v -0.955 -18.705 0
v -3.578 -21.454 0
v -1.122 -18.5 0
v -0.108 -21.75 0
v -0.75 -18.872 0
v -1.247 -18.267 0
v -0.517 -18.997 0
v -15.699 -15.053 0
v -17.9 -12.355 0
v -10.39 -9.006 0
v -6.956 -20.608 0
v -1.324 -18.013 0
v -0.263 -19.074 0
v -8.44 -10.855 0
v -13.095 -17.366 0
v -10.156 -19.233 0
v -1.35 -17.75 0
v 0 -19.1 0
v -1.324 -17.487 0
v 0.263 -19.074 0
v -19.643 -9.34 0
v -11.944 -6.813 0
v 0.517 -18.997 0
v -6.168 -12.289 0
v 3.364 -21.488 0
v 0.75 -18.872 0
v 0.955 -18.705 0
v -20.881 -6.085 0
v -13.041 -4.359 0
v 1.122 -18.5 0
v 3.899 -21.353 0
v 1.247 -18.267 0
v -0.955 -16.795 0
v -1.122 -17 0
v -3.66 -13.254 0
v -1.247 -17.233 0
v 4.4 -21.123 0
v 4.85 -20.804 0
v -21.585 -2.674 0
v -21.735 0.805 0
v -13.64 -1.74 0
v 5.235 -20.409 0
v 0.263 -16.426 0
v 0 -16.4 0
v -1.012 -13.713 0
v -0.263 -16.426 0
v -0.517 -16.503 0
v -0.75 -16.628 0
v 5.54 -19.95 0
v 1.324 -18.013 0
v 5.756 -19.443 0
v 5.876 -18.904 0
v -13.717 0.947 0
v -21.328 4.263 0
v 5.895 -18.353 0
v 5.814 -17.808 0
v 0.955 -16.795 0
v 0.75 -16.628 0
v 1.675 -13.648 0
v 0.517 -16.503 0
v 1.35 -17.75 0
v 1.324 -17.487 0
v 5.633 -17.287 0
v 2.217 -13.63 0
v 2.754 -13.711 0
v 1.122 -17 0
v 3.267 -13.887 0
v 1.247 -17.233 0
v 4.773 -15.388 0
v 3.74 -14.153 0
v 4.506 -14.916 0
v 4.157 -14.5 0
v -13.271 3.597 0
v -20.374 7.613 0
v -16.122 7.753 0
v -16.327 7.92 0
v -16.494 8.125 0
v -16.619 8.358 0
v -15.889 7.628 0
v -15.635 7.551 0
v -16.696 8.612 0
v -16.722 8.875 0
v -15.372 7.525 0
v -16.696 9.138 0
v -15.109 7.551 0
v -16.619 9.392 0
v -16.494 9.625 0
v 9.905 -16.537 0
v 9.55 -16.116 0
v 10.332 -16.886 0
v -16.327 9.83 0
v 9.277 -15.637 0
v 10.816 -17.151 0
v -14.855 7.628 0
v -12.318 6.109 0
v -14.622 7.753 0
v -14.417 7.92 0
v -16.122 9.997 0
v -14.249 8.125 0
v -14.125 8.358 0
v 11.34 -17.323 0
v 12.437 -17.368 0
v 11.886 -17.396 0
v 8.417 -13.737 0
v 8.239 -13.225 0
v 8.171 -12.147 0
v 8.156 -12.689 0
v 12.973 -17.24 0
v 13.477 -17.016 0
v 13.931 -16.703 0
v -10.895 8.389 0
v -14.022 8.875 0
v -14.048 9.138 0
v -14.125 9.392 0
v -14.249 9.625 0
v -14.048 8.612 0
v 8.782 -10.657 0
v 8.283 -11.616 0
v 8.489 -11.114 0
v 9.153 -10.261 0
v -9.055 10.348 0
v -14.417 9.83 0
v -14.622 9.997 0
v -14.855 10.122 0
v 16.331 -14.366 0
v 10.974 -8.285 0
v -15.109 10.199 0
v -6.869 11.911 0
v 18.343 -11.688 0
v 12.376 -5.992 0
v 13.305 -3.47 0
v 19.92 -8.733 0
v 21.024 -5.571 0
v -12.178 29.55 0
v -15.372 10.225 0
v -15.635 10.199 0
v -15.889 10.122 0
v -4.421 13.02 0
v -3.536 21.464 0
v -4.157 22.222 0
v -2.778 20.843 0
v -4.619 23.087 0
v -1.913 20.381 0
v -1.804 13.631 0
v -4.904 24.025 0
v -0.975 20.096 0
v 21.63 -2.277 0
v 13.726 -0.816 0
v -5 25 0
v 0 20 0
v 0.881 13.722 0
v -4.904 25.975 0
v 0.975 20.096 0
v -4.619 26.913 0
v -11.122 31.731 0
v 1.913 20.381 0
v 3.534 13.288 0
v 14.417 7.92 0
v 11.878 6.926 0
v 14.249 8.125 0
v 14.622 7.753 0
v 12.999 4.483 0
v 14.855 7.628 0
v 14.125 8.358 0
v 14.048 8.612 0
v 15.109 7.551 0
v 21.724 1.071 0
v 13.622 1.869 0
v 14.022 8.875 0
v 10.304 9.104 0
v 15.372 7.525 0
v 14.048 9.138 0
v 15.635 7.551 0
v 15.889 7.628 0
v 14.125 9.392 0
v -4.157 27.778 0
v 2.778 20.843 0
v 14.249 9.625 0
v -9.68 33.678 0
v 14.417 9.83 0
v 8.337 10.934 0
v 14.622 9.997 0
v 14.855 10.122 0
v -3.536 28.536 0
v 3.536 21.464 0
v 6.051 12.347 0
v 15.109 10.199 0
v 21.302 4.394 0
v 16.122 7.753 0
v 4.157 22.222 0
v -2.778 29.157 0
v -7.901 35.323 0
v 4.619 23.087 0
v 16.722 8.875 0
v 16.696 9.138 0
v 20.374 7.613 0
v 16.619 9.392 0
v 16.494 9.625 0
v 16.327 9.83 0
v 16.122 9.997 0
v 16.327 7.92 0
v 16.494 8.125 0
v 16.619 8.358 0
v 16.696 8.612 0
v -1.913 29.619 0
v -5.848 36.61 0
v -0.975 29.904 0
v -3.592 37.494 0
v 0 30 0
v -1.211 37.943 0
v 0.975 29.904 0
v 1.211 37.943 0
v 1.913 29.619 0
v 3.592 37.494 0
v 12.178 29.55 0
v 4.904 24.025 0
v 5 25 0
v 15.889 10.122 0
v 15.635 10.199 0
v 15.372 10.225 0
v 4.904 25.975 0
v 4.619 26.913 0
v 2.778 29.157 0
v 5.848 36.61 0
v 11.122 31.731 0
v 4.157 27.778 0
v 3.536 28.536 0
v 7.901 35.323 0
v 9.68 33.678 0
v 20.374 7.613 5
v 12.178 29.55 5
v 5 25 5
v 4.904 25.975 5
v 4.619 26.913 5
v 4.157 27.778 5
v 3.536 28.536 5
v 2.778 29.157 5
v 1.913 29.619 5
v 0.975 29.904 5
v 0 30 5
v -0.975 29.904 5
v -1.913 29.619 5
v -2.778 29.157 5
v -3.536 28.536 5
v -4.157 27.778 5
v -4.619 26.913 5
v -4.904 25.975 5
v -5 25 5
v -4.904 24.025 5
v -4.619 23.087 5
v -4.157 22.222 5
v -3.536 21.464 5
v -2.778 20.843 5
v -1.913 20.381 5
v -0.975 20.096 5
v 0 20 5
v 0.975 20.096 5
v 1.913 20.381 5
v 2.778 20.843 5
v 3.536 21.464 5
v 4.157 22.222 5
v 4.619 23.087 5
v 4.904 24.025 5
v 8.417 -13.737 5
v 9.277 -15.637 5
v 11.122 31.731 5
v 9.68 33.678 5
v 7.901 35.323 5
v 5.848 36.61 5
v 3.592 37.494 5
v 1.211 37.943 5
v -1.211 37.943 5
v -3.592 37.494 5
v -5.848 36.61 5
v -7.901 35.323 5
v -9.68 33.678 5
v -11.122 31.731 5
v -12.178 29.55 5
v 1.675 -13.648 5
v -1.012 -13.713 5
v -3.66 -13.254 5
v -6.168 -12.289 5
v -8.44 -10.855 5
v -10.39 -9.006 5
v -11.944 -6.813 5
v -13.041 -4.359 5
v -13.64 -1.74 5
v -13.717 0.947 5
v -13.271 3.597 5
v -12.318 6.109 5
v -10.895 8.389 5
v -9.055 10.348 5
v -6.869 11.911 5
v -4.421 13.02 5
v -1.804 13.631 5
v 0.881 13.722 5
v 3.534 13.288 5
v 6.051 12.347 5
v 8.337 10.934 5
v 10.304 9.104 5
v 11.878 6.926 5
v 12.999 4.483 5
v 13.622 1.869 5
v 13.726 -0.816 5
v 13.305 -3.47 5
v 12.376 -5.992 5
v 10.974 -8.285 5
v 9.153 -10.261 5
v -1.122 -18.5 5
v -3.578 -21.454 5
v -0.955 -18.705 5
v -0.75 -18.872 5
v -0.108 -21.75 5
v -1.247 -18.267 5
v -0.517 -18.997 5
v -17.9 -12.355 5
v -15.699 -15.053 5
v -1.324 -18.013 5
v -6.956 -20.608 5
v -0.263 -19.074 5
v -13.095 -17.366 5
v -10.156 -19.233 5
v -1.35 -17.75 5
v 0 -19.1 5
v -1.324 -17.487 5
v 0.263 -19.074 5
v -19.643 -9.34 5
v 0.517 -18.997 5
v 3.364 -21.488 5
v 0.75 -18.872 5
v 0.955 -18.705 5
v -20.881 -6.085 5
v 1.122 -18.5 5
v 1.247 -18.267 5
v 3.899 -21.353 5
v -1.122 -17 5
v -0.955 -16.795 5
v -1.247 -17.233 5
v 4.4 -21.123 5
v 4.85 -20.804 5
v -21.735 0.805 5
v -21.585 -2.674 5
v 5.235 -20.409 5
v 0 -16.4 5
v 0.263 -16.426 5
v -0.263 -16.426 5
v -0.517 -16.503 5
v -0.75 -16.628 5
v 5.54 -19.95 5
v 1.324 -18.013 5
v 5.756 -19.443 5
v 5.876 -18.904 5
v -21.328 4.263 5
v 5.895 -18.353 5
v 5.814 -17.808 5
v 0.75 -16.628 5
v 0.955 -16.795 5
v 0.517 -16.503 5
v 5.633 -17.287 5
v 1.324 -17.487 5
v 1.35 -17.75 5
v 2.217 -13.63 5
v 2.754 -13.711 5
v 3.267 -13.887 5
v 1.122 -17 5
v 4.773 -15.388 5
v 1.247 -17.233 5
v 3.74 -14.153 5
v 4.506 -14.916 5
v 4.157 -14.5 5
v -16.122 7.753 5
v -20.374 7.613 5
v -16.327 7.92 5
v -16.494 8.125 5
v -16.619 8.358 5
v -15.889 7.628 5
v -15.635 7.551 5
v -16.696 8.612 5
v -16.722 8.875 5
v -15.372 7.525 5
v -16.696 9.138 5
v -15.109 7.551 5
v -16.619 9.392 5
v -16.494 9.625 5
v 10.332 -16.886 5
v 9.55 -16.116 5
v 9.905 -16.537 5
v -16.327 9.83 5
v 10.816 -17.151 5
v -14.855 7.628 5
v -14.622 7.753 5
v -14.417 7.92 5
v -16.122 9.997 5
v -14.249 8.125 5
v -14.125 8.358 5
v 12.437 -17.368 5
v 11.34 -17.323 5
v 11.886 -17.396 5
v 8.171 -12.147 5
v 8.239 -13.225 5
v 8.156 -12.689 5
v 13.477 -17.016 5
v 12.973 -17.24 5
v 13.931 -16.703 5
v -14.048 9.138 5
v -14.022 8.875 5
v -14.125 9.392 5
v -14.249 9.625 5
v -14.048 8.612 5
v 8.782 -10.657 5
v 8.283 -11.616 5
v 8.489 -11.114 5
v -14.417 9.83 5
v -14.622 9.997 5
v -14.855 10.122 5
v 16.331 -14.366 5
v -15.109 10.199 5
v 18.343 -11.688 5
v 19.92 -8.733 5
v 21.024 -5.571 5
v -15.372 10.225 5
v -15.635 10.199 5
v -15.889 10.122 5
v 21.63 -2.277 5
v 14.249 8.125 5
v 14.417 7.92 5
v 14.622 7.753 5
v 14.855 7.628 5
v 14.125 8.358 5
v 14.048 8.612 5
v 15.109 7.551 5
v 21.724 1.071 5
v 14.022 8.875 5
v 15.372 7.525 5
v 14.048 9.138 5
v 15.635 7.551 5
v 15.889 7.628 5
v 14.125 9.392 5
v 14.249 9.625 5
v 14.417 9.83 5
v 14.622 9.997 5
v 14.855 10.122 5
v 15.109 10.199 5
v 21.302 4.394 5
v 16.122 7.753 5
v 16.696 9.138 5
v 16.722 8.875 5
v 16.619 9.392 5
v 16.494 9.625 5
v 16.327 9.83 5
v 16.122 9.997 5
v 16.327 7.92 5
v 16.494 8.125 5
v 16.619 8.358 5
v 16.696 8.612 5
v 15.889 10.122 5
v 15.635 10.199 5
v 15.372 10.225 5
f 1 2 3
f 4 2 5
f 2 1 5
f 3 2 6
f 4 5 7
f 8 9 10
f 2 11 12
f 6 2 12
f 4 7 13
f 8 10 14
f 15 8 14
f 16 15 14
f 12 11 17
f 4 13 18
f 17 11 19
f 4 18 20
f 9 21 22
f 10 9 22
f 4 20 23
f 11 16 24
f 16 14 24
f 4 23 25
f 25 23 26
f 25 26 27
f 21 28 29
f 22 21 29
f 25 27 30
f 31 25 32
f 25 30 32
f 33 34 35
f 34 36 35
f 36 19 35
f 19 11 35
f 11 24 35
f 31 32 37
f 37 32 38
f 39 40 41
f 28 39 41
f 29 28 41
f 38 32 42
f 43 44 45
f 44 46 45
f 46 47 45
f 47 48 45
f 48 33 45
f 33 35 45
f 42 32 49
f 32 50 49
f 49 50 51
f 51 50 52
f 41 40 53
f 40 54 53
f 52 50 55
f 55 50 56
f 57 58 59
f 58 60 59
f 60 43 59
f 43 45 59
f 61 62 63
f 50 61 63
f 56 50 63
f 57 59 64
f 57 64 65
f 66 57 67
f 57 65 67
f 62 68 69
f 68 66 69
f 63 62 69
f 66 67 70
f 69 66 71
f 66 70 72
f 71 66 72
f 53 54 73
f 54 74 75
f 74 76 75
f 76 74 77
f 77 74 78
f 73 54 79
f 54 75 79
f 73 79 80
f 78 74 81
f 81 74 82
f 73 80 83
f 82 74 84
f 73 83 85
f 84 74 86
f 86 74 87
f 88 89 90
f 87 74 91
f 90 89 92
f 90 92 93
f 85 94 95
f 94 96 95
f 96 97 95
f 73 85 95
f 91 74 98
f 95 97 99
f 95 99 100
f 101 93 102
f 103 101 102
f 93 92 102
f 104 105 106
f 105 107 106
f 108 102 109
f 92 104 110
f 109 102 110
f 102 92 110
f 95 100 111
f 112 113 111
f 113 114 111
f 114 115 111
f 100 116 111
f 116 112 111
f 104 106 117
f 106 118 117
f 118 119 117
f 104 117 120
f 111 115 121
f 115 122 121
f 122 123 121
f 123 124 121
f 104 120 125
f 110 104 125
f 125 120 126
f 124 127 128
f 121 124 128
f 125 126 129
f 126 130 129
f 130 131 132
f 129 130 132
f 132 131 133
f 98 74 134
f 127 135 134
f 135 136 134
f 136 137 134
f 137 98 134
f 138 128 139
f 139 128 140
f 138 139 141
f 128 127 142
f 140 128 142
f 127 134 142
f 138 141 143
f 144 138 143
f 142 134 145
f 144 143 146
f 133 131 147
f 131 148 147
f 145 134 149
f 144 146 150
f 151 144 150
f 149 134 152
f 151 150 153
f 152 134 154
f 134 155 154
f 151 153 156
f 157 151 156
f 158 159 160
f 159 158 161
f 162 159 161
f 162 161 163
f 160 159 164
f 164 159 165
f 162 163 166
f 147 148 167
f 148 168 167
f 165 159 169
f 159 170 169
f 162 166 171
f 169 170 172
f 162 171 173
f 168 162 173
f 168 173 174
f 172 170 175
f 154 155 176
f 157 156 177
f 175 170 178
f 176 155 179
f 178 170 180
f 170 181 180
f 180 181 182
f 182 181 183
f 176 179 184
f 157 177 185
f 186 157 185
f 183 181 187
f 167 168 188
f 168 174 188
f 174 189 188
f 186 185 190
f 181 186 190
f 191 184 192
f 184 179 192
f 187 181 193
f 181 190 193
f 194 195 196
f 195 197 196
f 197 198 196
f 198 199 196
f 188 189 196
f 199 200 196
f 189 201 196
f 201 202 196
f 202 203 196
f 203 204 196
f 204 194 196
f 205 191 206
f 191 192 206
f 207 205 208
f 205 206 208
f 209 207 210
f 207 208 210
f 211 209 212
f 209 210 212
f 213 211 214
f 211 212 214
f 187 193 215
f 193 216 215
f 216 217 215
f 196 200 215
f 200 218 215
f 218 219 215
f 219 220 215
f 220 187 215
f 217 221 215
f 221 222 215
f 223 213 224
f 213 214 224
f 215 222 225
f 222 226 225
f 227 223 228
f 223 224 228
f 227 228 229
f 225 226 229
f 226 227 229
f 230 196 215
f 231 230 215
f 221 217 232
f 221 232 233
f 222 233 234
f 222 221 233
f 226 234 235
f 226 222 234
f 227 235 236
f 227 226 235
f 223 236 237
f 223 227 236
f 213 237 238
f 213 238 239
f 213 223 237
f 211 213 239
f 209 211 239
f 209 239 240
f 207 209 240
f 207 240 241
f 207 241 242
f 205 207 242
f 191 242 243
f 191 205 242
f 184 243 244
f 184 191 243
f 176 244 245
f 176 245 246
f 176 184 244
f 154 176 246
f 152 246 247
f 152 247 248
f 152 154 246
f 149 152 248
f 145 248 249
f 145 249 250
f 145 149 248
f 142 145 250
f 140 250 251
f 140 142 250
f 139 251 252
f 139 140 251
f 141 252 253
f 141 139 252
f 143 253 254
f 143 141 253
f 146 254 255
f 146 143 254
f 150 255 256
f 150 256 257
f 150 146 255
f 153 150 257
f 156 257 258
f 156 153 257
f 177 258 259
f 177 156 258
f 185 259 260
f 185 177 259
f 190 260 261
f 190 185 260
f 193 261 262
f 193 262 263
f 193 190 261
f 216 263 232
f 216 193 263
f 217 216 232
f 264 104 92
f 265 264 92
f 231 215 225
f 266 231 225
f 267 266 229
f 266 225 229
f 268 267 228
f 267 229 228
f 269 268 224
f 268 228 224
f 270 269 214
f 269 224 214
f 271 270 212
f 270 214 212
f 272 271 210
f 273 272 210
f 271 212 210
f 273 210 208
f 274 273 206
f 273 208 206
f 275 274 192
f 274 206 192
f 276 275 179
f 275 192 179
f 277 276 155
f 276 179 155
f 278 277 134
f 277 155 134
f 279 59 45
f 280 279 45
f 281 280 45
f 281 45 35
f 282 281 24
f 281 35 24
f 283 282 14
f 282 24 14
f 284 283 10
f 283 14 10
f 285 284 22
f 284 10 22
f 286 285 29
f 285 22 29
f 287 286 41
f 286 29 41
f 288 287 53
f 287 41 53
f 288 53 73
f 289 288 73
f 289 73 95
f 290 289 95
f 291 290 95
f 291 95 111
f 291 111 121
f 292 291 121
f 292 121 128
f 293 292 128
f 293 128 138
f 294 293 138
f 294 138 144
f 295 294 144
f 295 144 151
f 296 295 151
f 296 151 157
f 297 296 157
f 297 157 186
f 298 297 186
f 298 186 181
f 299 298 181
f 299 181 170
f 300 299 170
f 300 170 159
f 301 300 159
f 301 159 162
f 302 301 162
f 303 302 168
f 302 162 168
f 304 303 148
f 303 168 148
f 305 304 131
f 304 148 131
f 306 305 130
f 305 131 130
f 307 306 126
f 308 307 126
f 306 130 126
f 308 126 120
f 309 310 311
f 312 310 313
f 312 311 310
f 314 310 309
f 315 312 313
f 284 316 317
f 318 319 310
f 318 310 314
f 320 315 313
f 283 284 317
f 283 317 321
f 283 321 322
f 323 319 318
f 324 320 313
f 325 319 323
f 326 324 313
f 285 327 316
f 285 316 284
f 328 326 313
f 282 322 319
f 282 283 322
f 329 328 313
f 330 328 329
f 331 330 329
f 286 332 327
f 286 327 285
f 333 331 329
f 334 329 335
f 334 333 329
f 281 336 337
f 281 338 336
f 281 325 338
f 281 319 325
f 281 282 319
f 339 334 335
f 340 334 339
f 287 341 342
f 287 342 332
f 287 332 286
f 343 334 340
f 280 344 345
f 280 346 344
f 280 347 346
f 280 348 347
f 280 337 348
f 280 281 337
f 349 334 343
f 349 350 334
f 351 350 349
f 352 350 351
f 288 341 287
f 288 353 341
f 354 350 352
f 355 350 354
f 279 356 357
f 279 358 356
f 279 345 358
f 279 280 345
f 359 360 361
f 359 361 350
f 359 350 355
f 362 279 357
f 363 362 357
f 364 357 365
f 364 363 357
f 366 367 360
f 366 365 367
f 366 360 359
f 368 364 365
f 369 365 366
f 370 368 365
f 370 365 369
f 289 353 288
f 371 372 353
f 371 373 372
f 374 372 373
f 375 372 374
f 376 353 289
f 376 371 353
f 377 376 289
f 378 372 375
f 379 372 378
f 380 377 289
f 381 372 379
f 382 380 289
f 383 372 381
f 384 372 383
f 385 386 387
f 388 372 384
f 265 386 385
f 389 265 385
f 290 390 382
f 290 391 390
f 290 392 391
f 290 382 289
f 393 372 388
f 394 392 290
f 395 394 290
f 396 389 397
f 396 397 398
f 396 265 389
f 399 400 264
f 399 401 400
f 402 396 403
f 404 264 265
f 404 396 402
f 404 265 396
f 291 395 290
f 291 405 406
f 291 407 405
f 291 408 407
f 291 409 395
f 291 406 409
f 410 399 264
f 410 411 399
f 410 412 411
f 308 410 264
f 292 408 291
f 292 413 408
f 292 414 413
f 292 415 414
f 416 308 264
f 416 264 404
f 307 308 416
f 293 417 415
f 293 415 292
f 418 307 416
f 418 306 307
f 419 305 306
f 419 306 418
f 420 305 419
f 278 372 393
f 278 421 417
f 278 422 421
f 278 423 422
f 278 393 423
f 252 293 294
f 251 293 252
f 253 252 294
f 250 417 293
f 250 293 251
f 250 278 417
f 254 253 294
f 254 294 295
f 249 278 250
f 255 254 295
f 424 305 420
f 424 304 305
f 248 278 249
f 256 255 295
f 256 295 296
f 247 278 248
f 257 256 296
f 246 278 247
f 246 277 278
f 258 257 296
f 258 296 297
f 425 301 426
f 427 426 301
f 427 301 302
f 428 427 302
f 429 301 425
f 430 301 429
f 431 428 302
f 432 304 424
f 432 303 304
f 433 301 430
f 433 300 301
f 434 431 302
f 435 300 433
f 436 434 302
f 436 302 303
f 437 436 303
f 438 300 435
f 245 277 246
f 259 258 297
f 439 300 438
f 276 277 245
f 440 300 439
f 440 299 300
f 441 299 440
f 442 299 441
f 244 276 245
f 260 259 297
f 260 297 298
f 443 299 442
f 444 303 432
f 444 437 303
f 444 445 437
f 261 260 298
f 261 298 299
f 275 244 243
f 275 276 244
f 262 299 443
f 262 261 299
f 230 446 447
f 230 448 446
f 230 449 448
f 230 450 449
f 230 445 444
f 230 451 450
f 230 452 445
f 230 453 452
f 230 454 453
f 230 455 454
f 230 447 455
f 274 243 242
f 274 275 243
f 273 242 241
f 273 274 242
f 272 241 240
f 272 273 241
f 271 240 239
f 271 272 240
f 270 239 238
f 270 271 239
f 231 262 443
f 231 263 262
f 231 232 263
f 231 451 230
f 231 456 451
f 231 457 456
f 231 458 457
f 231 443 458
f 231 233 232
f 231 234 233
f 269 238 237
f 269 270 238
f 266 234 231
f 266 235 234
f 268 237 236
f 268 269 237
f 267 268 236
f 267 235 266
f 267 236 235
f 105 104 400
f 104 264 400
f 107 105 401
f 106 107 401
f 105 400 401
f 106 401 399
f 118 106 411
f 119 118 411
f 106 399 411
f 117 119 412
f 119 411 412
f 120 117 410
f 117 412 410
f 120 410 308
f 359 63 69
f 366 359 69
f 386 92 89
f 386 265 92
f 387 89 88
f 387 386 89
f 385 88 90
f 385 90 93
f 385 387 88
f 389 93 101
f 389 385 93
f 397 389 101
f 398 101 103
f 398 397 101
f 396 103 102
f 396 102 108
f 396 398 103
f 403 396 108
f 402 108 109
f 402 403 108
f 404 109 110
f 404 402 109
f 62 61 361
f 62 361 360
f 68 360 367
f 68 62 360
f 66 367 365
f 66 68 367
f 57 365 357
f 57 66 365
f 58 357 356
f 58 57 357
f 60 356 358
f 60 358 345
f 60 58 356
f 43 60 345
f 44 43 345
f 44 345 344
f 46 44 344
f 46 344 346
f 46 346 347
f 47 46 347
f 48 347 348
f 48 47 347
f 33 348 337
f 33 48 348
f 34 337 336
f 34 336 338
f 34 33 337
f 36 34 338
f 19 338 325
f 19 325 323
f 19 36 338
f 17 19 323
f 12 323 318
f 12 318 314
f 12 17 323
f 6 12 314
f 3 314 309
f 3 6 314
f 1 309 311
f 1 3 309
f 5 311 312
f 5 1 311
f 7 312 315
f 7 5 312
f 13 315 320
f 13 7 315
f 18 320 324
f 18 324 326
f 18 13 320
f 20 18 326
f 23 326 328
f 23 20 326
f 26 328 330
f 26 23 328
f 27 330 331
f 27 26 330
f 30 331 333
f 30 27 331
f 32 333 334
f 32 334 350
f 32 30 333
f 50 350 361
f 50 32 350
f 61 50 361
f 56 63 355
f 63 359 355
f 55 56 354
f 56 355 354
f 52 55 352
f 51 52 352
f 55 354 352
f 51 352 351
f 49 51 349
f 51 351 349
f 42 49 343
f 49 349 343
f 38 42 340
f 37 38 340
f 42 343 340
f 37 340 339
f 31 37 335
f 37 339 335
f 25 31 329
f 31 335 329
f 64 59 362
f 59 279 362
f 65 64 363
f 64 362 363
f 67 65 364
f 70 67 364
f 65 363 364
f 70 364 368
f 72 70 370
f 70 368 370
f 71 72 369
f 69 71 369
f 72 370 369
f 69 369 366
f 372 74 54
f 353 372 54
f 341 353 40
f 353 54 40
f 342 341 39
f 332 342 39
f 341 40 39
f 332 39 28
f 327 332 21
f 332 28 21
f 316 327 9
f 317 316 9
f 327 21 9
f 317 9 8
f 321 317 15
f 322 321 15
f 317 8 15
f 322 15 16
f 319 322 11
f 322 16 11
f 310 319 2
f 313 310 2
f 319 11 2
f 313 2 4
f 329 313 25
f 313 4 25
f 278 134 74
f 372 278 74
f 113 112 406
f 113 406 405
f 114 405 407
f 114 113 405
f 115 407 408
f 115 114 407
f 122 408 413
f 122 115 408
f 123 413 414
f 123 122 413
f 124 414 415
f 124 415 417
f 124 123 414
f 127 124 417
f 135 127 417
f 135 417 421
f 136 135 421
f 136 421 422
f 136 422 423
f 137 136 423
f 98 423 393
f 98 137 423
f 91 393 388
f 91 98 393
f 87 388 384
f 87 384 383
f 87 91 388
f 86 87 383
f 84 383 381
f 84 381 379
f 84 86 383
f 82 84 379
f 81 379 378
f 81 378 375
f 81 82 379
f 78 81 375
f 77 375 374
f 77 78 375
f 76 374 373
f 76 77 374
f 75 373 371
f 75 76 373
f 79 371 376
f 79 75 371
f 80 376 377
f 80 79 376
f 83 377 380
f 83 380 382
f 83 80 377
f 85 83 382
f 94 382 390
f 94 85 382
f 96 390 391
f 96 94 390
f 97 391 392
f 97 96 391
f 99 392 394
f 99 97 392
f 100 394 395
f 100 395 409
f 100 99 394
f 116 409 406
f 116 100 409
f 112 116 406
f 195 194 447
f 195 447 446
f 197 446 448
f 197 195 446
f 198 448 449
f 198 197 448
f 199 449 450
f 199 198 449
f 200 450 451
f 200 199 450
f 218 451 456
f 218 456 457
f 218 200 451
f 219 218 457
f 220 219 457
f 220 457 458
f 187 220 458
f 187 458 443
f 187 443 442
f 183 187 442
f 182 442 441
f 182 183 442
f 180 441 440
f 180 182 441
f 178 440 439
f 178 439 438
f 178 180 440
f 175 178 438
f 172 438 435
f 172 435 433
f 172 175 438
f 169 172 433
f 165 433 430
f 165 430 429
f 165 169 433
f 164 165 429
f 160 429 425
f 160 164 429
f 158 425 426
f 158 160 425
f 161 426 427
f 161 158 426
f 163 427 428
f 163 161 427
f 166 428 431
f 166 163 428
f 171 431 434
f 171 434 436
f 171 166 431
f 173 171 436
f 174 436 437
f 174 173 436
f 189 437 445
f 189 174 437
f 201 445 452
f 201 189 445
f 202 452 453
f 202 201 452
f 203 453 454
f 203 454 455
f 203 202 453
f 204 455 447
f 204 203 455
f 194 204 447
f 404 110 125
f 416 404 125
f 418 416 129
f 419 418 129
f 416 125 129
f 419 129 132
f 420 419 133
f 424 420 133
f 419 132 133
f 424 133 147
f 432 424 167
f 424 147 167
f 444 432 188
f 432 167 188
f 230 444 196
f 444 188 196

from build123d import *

# Parameters (mm, degrees)
SKETCH1_R           = 5
SKETCH1_R_2         = 1.35
BOSS_EXTRUDE1_DEPTH = 5
CONG_2_R            = 3


with BuildPart() as part:
    # Sketch1 → Boss-Extrude1 (new body)
    with BuildSketch(Plane.XY):
        with BuildLine():
            Line((7.433976594, -11.567129808), (10.756607468, -18.903912182))
            ThreePointArc((10.756607468, -18.903912182), (20.44660049, -7.416132981), (20.37430597, 7.6125))
            Line((20.37430597, 7.6125), (12.177746097, 29.55))
            ThreePointArc((12.177746097, 29.55), (0, 38), (-12.177746097, 29.55))
            Line((-12.177746097, 29.55), (-20.37430597, 7.6125))
            ThreePointArc((-20.37430597, 7.6125), (-15.56616527, -15.190687897), (7.112849411, -20.554071939))
            Line((7.112849411, -20.554071939), (3.790218537, -13.217289565))
            ThreePointArc((3.790218537, -13.217289565), (-5.672424163, 12.525418321), (7.433976594, -11.567129808))
        make_face()
        with Locations((0, 25)):
            Circle(SKETCH1_R, mode=Mode.SUBTRACT)
        with Locations((0, -17.75)):
            Circle(SKETCH1_R_2, mode=Mode.SUBTRACT)
        with Locations((15.371950917, 8.875)):
            Circle(SKETCH1_R_2, mode=Mode.SUBTRACT)
        with Locations((-15.371950917, 8.875)):
            Circle(SKETCH1_R_2, mode=Mode.SUBTRACT)
    extrude(amount=BOSS_EXTRUDE1_DEPTH)

    # Congé2
    cong_2_edges = [part.edges().sort_by_distance(p)[0] for p in [
        (3.790218537, -13.217289565, 2.5),
        (7.112849411, -20.554071939, 2.5),
        (10.756607468, -18.903912182, 2.5),
        (7.433976594, -11.567129808, 2.5),
    ]]
    fillet(cong_2_edges, radius=CONG_2_R)


solid = part.part
